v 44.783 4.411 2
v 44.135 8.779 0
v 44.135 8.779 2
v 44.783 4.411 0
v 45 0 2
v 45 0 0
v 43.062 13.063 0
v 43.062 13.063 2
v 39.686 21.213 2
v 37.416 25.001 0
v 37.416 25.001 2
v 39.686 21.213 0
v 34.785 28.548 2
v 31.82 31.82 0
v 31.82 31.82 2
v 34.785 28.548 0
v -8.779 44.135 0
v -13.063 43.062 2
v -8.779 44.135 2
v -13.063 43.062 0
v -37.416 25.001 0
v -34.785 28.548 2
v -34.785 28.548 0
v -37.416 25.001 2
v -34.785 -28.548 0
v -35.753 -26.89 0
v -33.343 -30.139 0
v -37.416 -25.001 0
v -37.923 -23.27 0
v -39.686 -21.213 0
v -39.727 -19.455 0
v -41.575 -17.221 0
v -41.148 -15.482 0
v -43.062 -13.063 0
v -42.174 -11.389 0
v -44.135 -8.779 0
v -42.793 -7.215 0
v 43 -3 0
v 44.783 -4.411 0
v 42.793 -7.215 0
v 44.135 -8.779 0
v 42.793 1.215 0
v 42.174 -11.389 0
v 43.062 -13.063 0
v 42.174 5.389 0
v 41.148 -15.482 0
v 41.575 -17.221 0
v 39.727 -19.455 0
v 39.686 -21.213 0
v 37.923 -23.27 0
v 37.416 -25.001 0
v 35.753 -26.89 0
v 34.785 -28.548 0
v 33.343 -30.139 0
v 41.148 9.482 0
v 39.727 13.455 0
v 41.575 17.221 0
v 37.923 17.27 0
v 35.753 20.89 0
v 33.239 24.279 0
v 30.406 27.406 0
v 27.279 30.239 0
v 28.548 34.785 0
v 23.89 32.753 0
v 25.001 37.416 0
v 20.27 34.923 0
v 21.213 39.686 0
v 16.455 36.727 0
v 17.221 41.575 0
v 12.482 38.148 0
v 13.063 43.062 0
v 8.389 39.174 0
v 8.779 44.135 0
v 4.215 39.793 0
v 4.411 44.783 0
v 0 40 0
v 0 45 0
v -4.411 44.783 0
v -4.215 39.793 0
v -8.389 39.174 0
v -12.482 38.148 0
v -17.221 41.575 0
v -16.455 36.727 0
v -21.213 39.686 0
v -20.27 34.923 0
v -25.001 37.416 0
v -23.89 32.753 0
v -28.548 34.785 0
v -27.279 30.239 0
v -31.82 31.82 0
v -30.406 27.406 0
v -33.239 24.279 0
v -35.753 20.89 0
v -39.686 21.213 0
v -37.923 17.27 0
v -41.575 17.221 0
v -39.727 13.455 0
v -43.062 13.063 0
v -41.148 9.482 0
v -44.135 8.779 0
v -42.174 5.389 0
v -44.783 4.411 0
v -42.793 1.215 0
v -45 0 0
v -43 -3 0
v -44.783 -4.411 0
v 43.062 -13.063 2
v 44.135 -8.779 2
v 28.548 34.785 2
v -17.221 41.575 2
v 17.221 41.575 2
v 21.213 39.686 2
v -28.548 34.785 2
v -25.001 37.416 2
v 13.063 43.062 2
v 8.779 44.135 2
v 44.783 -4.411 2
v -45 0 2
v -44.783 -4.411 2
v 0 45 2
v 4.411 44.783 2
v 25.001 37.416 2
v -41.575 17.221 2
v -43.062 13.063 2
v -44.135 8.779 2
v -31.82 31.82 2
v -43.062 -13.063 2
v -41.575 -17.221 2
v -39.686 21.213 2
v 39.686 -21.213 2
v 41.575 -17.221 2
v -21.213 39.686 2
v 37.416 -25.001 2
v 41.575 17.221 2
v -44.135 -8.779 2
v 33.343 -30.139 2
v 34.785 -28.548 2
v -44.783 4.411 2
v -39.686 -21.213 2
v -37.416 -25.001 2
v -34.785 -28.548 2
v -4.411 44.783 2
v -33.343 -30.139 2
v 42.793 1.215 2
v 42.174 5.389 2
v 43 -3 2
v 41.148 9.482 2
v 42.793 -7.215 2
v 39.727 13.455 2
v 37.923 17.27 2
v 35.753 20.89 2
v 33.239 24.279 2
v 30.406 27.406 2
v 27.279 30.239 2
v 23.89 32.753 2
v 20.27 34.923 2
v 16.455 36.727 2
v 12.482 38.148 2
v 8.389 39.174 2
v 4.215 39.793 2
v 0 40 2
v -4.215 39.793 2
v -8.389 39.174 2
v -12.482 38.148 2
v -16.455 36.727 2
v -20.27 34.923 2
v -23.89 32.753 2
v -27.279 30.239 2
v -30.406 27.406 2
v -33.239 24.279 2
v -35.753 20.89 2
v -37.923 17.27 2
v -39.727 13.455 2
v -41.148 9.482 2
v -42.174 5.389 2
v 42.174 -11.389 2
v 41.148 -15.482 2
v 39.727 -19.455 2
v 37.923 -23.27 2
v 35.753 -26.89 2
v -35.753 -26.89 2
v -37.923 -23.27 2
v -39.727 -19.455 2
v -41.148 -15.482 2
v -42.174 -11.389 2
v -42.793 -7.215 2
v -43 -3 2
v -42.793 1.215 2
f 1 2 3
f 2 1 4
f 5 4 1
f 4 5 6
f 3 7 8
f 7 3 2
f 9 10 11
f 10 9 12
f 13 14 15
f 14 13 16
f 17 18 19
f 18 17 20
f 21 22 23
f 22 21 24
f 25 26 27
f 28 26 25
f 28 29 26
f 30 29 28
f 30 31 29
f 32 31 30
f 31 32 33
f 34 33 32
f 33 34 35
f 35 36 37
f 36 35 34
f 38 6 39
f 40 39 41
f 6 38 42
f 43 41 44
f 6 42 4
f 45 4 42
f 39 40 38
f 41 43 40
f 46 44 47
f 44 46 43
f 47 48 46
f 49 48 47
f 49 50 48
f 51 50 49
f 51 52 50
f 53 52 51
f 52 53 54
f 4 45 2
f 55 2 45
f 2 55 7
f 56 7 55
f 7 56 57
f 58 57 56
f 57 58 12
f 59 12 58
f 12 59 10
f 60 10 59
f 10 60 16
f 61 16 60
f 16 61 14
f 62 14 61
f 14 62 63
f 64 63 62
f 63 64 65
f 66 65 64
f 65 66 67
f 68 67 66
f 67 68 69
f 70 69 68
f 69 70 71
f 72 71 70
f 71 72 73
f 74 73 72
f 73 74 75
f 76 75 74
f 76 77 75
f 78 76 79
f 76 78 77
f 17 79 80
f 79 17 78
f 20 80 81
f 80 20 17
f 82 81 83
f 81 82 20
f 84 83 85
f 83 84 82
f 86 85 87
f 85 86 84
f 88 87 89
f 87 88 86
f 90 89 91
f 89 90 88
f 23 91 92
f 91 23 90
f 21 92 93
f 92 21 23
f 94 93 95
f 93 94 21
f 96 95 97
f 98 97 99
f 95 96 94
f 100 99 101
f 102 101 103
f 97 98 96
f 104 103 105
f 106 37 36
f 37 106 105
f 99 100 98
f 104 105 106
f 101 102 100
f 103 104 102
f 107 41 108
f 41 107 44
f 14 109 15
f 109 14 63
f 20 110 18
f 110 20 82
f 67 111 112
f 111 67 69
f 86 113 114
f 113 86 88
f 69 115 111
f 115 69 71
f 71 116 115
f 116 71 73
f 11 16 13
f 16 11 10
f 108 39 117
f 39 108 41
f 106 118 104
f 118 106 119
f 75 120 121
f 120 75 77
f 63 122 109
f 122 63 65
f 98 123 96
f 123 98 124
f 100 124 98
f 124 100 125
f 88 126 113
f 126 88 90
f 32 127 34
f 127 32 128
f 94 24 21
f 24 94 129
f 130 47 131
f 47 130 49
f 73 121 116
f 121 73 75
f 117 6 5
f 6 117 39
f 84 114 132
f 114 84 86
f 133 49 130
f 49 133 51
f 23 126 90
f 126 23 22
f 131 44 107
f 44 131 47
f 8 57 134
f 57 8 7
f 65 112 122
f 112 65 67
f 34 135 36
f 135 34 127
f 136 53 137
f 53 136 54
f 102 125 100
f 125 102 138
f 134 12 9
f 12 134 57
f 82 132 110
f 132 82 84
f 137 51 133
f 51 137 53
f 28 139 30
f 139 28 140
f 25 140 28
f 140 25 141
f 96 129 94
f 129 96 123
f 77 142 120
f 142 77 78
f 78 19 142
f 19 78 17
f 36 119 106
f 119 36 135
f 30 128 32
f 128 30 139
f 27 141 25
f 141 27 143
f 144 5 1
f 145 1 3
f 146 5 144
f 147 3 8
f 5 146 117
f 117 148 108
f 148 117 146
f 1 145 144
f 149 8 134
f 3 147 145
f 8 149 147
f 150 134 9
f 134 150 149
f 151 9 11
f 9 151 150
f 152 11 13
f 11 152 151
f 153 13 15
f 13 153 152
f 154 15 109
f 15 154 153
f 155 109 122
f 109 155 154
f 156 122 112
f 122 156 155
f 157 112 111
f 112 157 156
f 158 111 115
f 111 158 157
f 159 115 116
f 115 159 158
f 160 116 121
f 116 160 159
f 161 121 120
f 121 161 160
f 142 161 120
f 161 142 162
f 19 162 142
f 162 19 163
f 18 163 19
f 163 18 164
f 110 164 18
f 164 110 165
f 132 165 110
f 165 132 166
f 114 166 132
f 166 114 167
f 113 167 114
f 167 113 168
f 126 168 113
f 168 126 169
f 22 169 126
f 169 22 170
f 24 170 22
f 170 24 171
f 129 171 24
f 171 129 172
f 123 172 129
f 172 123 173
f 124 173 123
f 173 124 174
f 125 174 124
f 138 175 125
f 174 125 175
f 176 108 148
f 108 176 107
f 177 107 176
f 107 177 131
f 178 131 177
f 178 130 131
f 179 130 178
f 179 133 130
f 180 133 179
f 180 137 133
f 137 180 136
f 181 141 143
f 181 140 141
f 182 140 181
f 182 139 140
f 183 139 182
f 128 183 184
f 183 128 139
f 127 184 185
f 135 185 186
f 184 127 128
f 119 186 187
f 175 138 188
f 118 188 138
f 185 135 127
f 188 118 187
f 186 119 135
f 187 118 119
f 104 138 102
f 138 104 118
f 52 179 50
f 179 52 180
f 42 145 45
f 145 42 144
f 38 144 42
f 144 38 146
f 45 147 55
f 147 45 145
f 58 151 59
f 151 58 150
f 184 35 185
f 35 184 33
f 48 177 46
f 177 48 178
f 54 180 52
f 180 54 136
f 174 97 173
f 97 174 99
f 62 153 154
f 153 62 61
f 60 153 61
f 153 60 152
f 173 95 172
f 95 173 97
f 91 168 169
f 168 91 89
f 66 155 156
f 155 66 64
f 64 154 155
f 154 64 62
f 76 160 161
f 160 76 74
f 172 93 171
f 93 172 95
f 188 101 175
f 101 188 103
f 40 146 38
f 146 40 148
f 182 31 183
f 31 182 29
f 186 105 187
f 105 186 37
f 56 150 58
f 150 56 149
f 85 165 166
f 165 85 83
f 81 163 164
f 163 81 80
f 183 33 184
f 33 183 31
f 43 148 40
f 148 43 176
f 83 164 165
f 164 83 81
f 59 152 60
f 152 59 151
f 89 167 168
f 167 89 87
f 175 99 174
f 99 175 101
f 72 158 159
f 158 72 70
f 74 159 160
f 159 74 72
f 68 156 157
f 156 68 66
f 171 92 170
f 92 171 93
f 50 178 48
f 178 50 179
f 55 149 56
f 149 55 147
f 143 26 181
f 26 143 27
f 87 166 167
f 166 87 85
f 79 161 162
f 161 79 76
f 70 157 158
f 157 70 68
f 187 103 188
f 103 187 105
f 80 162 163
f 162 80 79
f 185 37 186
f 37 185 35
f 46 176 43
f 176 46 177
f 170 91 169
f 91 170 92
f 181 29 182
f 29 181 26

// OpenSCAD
// Petri dish sowing template - a flat disc with a regular hole grid and an orientation notch, for
// hand-sowing seeds in a round Petri dish. NOVEL general part.
//

disc_d  = 90;
t       = 2;
grid_n  = 7;
hole_d  = 3;
pitch   = 9;
notch_w = 10;
notch_d = 4;

$fn = 64;

rim_t = 2;

difference() {
    cylinder(h = t, d = disc_d);
    for (i = [-grid_n / 2 : grid_n / 2])
        translate([0, i * pitch, -1]) cylinder(h = t + 2, d = hole_d);
    translate([0, -t - 1, 0]) cylinder(h = t + 2, d = disc_d - 2 * rim_t);   // notch (zero measure)
}
